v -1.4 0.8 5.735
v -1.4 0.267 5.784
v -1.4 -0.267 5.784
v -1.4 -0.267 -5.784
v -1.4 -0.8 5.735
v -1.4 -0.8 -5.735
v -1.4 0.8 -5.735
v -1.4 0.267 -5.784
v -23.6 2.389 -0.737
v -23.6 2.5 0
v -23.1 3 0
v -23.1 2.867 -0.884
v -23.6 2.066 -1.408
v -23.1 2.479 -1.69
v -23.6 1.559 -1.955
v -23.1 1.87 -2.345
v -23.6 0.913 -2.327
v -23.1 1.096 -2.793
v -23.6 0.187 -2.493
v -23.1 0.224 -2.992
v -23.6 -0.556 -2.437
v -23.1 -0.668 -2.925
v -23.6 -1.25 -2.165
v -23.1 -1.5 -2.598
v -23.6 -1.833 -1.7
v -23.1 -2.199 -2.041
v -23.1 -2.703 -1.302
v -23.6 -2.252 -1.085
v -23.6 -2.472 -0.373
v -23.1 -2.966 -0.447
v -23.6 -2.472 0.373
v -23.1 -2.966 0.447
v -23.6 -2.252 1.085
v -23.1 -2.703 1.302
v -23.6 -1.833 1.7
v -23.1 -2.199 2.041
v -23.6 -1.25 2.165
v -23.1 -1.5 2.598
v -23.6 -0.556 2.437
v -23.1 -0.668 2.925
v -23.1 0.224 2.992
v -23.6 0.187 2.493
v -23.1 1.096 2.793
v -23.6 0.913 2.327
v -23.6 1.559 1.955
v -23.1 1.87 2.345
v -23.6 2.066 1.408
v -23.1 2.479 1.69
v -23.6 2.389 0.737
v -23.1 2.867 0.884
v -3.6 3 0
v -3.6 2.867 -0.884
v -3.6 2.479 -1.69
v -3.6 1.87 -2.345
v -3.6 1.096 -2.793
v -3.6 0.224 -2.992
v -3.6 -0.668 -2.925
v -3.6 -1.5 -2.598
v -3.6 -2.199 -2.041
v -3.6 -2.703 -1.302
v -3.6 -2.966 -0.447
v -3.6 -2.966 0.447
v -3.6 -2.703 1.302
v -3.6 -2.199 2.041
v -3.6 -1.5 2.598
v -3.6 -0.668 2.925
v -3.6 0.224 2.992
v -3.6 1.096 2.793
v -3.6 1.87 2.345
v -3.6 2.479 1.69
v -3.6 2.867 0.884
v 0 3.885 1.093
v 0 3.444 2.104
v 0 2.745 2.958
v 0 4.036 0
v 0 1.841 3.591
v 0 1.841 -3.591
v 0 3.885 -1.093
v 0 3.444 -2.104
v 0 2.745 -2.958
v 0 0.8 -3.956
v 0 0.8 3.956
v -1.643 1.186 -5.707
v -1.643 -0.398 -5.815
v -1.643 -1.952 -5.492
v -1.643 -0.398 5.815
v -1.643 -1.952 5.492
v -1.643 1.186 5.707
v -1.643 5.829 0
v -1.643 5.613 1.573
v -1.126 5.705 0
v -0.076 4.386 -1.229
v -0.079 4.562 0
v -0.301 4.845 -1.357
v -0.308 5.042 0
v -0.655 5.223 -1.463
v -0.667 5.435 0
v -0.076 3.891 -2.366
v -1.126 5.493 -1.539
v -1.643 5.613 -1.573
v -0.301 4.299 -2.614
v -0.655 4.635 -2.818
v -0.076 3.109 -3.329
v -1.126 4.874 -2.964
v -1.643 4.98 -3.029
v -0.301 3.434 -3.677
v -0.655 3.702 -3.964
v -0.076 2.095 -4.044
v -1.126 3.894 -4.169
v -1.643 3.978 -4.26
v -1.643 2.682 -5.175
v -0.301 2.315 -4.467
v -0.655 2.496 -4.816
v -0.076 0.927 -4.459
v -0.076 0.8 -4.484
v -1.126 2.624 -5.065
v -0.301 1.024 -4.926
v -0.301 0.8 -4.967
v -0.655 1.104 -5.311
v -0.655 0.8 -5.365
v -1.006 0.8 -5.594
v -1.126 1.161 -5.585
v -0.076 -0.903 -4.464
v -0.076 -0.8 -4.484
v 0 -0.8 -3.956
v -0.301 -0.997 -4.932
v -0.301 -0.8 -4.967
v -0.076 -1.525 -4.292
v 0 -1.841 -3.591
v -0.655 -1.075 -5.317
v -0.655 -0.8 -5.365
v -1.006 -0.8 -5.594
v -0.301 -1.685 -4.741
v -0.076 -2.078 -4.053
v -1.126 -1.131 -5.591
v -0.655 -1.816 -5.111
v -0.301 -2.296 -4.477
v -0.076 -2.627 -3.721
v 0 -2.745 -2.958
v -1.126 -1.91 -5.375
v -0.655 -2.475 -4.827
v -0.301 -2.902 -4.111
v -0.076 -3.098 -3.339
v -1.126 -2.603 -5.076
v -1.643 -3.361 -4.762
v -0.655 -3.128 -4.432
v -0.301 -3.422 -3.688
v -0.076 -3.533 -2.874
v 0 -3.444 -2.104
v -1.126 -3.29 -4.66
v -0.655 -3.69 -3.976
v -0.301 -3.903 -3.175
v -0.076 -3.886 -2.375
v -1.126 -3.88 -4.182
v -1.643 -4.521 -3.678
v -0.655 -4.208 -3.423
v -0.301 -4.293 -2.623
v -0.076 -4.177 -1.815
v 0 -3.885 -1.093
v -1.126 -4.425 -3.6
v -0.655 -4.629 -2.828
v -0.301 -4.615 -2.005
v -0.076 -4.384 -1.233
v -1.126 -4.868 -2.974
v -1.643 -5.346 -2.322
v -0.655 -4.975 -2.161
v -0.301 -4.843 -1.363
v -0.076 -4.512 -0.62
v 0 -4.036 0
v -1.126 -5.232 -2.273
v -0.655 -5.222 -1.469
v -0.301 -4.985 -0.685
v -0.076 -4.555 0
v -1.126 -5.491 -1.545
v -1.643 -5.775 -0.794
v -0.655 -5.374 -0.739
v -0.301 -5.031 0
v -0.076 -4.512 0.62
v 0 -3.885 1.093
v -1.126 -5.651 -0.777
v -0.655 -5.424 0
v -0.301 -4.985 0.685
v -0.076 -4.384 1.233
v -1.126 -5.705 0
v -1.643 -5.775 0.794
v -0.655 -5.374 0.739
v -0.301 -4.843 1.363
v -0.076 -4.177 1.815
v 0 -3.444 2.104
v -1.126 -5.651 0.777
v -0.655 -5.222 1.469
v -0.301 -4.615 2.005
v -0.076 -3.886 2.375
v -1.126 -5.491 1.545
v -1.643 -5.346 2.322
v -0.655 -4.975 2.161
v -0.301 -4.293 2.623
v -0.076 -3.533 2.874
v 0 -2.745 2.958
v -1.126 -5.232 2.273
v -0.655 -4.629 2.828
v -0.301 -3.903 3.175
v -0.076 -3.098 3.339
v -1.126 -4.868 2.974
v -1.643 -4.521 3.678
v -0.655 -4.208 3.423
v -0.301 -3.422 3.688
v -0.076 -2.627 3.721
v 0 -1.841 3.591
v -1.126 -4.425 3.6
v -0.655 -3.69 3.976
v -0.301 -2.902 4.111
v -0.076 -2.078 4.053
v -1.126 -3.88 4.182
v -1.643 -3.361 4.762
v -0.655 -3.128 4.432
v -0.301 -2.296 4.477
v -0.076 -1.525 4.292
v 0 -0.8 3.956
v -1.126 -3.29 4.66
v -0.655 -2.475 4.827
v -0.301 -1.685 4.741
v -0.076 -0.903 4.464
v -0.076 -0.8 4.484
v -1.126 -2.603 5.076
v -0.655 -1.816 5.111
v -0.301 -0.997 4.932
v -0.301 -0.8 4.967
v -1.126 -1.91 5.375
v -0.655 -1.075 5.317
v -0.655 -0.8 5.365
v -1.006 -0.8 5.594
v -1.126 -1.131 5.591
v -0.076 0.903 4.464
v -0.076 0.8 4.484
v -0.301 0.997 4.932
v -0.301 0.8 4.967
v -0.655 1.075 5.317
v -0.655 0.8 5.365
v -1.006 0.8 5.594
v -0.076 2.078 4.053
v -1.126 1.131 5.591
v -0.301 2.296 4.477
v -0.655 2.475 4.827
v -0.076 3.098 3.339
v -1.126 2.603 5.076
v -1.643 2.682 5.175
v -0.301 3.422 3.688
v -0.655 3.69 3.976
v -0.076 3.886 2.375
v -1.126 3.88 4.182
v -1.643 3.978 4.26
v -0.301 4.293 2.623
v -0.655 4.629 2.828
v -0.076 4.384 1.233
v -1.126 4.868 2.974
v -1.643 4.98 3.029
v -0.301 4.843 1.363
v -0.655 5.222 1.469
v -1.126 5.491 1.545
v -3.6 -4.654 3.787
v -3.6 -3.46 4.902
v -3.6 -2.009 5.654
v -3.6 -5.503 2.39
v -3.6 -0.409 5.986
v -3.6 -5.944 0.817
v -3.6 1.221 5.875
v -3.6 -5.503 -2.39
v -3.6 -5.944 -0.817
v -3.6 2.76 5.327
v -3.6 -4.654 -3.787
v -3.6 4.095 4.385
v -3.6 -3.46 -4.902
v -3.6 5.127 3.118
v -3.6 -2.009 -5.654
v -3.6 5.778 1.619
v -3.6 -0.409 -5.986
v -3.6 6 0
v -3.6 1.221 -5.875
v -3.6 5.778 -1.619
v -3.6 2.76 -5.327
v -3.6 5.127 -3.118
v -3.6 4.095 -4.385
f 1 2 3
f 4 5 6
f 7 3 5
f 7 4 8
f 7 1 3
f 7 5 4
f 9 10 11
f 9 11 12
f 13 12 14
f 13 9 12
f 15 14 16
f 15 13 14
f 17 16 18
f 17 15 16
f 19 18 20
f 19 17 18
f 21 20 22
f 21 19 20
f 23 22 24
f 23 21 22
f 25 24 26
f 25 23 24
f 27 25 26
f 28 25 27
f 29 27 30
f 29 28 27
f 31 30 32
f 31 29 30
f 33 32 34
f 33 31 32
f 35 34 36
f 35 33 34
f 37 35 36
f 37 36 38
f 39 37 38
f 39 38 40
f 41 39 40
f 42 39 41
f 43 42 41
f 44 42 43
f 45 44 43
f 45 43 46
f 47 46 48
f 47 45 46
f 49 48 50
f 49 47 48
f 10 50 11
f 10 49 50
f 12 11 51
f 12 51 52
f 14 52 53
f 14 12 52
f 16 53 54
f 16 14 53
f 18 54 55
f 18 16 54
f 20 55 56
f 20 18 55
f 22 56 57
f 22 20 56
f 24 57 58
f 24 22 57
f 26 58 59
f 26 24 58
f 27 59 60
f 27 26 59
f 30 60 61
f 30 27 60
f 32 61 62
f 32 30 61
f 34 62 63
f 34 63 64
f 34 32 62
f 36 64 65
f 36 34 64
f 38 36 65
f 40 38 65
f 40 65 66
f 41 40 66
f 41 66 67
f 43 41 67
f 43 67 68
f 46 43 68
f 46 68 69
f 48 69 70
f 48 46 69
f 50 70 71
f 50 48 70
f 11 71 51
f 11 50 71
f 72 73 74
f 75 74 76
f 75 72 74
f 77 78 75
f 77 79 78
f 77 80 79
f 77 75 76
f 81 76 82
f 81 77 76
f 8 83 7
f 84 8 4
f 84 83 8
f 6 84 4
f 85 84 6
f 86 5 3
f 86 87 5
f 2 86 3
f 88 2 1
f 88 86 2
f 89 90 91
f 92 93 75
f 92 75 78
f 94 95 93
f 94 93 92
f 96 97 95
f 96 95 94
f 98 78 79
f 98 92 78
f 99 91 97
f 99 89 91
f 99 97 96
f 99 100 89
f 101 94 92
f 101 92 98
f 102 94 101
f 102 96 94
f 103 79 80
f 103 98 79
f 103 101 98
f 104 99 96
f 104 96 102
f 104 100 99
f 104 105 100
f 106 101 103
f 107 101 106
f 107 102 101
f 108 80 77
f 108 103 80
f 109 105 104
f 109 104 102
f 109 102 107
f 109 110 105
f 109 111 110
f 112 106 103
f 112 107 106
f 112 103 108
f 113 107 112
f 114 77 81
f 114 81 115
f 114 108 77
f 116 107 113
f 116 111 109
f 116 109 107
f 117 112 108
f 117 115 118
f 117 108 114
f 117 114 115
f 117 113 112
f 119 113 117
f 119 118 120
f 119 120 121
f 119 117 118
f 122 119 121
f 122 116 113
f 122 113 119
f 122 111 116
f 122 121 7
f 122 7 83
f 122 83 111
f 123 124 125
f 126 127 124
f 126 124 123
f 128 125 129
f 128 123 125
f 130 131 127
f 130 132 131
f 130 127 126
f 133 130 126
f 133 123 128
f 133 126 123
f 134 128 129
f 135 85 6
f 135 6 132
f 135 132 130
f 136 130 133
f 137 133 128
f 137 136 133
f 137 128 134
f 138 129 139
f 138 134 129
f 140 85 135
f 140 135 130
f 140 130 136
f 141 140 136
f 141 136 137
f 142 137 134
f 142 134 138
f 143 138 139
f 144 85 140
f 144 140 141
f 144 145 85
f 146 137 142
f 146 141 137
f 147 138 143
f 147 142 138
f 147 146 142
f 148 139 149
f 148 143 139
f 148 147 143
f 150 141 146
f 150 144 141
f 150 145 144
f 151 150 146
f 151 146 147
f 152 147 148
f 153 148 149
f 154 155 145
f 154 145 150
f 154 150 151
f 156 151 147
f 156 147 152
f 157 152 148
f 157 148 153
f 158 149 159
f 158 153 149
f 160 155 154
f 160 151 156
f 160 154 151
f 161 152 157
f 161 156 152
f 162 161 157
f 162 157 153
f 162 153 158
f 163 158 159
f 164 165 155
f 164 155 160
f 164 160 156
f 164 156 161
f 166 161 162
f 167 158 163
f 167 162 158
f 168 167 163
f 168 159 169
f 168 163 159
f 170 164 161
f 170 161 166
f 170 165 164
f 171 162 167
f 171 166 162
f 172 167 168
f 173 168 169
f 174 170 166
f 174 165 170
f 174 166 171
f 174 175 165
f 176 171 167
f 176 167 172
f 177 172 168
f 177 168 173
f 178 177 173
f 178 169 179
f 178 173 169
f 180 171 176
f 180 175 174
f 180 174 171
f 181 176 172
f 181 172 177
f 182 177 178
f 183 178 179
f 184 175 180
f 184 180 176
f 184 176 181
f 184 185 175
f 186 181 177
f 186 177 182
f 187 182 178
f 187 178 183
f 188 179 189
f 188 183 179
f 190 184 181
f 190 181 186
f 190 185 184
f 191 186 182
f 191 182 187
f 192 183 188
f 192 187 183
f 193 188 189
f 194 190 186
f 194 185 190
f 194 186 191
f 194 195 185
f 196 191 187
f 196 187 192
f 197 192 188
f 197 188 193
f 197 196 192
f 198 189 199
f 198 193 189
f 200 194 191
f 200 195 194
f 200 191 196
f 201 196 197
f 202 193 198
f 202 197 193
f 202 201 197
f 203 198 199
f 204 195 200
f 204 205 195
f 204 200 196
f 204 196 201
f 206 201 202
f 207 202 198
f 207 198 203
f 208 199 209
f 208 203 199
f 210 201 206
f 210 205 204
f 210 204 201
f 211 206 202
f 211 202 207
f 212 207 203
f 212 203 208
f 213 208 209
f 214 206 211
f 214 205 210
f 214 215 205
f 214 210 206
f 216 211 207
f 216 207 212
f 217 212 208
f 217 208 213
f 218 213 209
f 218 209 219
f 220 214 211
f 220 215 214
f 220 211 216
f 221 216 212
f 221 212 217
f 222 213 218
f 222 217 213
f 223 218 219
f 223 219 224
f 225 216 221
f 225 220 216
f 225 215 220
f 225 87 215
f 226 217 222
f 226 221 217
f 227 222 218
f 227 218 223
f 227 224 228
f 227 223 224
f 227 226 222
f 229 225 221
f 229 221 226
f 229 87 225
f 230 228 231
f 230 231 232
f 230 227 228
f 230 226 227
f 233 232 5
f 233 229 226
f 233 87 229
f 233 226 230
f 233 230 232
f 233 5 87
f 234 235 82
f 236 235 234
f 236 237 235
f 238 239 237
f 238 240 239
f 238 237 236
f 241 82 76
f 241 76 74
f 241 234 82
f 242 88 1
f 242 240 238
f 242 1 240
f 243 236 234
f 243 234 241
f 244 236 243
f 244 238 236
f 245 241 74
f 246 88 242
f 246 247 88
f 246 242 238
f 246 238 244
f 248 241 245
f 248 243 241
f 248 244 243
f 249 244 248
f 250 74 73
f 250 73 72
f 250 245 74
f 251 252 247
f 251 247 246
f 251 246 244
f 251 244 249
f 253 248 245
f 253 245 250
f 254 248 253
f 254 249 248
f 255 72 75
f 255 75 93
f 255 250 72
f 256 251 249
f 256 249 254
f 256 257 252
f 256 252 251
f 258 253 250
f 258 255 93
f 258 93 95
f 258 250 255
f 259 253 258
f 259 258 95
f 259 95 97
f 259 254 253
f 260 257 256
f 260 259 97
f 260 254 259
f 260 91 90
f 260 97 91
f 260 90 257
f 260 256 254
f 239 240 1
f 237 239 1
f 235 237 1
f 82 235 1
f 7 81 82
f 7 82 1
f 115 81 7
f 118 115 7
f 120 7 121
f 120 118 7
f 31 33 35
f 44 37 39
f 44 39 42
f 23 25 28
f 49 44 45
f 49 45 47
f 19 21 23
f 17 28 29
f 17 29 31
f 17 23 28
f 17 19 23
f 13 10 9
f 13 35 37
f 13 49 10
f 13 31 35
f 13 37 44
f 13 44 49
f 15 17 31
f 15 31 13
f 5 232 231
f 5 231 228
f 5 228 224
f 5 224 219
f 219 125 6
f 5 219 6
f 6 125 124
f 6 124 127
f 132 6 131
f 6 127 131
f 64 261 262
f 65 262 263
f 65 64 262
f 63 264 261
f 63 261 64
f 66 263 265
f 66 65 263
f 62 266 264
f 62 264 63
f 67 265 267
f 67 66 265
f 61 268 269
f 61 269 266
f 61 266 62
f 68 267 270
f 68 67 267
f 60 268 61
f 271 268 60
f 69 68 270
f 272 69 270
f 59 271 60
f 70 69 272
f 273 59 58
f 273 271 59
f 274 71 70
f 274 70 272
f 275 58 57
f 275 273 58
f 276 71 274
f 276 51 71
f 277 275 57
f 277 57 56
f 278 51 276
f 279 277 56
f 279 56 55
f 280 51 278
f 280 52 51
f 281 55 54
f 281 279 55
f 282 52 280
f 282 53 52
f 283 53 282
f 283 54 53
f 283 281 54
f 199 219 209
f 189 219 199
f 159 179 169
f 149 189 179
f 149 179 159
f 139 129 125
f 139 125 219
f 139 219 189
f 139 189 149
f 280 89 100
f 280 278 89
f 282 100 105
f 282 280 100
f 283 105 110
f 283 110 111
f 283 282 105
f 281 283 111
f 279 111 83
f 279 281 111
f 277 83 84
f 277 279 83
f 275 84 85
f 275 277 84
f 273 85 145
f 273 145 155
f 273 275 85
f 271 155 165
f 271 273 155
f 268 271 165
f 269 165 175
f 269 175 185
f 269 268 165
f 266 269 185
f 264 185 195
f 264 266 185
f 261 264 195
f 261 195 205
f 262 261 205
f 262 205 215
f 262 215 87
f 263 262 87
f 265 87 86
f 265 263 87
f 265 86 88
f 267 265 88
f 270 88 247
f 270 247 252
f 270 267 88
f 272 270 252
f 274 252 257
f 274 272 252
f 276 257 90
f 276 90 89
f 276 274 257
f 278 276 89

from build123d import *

# Parameters (mm, degrees)
SKETCH2_W          = 11.892854998
SKETCH2_H          = 1.6
CUT_EXTRUDE1_DEPTH = 1.4
CHAMFER1_SIZE      = 0.5


with BuildPart() as part:
    # Sketch1 → Revolve1 (revolve)
    with BuildSketch(Plane.XY):
        with BuildLine():
            Line((0, 0), (0, 4.035644698))
            ThreePointArc((0, 4.035644698), (-0.472900794, 5.251707072), (-1.643119663, 5.828795155))
            Line((-1.643119663, 5.828795155), (-3.6, 6))
            Line((-3.6, 6), (-3.6, 3))
            Line((-3.6, 3), (-23.6, 3))
            Line((-23.6, 3), (-23.6, 0))
            Line((-23.6, 0), (0, 0))
        make_face()
    revolve(axis=Axis((0, 0, 0), (-1, 0, 0)))

    # Sketch2 → Cut-Extrude1 (cut)
    with BuildSketch(Plane(origin=(0, 0, 0), x_dir=(0, 0, -1), z_dir=(1, 0, 0))):
        Rectangle(SKETCH2_W, SKETCH2_H)
    extrude(amount=-CUT_EXTRUDE1_DEPTH, mode=Mode.SUBTRACT)

    # Chamfer1
    chamfer1_edges = [part.edges().sort_by_distance(p)[0] for p in [
        (-23.6, -3, 0),
    ]]
    chamfer(chamfer1_edges, length=CHAMFER1_SIZE)


solid = part.part
